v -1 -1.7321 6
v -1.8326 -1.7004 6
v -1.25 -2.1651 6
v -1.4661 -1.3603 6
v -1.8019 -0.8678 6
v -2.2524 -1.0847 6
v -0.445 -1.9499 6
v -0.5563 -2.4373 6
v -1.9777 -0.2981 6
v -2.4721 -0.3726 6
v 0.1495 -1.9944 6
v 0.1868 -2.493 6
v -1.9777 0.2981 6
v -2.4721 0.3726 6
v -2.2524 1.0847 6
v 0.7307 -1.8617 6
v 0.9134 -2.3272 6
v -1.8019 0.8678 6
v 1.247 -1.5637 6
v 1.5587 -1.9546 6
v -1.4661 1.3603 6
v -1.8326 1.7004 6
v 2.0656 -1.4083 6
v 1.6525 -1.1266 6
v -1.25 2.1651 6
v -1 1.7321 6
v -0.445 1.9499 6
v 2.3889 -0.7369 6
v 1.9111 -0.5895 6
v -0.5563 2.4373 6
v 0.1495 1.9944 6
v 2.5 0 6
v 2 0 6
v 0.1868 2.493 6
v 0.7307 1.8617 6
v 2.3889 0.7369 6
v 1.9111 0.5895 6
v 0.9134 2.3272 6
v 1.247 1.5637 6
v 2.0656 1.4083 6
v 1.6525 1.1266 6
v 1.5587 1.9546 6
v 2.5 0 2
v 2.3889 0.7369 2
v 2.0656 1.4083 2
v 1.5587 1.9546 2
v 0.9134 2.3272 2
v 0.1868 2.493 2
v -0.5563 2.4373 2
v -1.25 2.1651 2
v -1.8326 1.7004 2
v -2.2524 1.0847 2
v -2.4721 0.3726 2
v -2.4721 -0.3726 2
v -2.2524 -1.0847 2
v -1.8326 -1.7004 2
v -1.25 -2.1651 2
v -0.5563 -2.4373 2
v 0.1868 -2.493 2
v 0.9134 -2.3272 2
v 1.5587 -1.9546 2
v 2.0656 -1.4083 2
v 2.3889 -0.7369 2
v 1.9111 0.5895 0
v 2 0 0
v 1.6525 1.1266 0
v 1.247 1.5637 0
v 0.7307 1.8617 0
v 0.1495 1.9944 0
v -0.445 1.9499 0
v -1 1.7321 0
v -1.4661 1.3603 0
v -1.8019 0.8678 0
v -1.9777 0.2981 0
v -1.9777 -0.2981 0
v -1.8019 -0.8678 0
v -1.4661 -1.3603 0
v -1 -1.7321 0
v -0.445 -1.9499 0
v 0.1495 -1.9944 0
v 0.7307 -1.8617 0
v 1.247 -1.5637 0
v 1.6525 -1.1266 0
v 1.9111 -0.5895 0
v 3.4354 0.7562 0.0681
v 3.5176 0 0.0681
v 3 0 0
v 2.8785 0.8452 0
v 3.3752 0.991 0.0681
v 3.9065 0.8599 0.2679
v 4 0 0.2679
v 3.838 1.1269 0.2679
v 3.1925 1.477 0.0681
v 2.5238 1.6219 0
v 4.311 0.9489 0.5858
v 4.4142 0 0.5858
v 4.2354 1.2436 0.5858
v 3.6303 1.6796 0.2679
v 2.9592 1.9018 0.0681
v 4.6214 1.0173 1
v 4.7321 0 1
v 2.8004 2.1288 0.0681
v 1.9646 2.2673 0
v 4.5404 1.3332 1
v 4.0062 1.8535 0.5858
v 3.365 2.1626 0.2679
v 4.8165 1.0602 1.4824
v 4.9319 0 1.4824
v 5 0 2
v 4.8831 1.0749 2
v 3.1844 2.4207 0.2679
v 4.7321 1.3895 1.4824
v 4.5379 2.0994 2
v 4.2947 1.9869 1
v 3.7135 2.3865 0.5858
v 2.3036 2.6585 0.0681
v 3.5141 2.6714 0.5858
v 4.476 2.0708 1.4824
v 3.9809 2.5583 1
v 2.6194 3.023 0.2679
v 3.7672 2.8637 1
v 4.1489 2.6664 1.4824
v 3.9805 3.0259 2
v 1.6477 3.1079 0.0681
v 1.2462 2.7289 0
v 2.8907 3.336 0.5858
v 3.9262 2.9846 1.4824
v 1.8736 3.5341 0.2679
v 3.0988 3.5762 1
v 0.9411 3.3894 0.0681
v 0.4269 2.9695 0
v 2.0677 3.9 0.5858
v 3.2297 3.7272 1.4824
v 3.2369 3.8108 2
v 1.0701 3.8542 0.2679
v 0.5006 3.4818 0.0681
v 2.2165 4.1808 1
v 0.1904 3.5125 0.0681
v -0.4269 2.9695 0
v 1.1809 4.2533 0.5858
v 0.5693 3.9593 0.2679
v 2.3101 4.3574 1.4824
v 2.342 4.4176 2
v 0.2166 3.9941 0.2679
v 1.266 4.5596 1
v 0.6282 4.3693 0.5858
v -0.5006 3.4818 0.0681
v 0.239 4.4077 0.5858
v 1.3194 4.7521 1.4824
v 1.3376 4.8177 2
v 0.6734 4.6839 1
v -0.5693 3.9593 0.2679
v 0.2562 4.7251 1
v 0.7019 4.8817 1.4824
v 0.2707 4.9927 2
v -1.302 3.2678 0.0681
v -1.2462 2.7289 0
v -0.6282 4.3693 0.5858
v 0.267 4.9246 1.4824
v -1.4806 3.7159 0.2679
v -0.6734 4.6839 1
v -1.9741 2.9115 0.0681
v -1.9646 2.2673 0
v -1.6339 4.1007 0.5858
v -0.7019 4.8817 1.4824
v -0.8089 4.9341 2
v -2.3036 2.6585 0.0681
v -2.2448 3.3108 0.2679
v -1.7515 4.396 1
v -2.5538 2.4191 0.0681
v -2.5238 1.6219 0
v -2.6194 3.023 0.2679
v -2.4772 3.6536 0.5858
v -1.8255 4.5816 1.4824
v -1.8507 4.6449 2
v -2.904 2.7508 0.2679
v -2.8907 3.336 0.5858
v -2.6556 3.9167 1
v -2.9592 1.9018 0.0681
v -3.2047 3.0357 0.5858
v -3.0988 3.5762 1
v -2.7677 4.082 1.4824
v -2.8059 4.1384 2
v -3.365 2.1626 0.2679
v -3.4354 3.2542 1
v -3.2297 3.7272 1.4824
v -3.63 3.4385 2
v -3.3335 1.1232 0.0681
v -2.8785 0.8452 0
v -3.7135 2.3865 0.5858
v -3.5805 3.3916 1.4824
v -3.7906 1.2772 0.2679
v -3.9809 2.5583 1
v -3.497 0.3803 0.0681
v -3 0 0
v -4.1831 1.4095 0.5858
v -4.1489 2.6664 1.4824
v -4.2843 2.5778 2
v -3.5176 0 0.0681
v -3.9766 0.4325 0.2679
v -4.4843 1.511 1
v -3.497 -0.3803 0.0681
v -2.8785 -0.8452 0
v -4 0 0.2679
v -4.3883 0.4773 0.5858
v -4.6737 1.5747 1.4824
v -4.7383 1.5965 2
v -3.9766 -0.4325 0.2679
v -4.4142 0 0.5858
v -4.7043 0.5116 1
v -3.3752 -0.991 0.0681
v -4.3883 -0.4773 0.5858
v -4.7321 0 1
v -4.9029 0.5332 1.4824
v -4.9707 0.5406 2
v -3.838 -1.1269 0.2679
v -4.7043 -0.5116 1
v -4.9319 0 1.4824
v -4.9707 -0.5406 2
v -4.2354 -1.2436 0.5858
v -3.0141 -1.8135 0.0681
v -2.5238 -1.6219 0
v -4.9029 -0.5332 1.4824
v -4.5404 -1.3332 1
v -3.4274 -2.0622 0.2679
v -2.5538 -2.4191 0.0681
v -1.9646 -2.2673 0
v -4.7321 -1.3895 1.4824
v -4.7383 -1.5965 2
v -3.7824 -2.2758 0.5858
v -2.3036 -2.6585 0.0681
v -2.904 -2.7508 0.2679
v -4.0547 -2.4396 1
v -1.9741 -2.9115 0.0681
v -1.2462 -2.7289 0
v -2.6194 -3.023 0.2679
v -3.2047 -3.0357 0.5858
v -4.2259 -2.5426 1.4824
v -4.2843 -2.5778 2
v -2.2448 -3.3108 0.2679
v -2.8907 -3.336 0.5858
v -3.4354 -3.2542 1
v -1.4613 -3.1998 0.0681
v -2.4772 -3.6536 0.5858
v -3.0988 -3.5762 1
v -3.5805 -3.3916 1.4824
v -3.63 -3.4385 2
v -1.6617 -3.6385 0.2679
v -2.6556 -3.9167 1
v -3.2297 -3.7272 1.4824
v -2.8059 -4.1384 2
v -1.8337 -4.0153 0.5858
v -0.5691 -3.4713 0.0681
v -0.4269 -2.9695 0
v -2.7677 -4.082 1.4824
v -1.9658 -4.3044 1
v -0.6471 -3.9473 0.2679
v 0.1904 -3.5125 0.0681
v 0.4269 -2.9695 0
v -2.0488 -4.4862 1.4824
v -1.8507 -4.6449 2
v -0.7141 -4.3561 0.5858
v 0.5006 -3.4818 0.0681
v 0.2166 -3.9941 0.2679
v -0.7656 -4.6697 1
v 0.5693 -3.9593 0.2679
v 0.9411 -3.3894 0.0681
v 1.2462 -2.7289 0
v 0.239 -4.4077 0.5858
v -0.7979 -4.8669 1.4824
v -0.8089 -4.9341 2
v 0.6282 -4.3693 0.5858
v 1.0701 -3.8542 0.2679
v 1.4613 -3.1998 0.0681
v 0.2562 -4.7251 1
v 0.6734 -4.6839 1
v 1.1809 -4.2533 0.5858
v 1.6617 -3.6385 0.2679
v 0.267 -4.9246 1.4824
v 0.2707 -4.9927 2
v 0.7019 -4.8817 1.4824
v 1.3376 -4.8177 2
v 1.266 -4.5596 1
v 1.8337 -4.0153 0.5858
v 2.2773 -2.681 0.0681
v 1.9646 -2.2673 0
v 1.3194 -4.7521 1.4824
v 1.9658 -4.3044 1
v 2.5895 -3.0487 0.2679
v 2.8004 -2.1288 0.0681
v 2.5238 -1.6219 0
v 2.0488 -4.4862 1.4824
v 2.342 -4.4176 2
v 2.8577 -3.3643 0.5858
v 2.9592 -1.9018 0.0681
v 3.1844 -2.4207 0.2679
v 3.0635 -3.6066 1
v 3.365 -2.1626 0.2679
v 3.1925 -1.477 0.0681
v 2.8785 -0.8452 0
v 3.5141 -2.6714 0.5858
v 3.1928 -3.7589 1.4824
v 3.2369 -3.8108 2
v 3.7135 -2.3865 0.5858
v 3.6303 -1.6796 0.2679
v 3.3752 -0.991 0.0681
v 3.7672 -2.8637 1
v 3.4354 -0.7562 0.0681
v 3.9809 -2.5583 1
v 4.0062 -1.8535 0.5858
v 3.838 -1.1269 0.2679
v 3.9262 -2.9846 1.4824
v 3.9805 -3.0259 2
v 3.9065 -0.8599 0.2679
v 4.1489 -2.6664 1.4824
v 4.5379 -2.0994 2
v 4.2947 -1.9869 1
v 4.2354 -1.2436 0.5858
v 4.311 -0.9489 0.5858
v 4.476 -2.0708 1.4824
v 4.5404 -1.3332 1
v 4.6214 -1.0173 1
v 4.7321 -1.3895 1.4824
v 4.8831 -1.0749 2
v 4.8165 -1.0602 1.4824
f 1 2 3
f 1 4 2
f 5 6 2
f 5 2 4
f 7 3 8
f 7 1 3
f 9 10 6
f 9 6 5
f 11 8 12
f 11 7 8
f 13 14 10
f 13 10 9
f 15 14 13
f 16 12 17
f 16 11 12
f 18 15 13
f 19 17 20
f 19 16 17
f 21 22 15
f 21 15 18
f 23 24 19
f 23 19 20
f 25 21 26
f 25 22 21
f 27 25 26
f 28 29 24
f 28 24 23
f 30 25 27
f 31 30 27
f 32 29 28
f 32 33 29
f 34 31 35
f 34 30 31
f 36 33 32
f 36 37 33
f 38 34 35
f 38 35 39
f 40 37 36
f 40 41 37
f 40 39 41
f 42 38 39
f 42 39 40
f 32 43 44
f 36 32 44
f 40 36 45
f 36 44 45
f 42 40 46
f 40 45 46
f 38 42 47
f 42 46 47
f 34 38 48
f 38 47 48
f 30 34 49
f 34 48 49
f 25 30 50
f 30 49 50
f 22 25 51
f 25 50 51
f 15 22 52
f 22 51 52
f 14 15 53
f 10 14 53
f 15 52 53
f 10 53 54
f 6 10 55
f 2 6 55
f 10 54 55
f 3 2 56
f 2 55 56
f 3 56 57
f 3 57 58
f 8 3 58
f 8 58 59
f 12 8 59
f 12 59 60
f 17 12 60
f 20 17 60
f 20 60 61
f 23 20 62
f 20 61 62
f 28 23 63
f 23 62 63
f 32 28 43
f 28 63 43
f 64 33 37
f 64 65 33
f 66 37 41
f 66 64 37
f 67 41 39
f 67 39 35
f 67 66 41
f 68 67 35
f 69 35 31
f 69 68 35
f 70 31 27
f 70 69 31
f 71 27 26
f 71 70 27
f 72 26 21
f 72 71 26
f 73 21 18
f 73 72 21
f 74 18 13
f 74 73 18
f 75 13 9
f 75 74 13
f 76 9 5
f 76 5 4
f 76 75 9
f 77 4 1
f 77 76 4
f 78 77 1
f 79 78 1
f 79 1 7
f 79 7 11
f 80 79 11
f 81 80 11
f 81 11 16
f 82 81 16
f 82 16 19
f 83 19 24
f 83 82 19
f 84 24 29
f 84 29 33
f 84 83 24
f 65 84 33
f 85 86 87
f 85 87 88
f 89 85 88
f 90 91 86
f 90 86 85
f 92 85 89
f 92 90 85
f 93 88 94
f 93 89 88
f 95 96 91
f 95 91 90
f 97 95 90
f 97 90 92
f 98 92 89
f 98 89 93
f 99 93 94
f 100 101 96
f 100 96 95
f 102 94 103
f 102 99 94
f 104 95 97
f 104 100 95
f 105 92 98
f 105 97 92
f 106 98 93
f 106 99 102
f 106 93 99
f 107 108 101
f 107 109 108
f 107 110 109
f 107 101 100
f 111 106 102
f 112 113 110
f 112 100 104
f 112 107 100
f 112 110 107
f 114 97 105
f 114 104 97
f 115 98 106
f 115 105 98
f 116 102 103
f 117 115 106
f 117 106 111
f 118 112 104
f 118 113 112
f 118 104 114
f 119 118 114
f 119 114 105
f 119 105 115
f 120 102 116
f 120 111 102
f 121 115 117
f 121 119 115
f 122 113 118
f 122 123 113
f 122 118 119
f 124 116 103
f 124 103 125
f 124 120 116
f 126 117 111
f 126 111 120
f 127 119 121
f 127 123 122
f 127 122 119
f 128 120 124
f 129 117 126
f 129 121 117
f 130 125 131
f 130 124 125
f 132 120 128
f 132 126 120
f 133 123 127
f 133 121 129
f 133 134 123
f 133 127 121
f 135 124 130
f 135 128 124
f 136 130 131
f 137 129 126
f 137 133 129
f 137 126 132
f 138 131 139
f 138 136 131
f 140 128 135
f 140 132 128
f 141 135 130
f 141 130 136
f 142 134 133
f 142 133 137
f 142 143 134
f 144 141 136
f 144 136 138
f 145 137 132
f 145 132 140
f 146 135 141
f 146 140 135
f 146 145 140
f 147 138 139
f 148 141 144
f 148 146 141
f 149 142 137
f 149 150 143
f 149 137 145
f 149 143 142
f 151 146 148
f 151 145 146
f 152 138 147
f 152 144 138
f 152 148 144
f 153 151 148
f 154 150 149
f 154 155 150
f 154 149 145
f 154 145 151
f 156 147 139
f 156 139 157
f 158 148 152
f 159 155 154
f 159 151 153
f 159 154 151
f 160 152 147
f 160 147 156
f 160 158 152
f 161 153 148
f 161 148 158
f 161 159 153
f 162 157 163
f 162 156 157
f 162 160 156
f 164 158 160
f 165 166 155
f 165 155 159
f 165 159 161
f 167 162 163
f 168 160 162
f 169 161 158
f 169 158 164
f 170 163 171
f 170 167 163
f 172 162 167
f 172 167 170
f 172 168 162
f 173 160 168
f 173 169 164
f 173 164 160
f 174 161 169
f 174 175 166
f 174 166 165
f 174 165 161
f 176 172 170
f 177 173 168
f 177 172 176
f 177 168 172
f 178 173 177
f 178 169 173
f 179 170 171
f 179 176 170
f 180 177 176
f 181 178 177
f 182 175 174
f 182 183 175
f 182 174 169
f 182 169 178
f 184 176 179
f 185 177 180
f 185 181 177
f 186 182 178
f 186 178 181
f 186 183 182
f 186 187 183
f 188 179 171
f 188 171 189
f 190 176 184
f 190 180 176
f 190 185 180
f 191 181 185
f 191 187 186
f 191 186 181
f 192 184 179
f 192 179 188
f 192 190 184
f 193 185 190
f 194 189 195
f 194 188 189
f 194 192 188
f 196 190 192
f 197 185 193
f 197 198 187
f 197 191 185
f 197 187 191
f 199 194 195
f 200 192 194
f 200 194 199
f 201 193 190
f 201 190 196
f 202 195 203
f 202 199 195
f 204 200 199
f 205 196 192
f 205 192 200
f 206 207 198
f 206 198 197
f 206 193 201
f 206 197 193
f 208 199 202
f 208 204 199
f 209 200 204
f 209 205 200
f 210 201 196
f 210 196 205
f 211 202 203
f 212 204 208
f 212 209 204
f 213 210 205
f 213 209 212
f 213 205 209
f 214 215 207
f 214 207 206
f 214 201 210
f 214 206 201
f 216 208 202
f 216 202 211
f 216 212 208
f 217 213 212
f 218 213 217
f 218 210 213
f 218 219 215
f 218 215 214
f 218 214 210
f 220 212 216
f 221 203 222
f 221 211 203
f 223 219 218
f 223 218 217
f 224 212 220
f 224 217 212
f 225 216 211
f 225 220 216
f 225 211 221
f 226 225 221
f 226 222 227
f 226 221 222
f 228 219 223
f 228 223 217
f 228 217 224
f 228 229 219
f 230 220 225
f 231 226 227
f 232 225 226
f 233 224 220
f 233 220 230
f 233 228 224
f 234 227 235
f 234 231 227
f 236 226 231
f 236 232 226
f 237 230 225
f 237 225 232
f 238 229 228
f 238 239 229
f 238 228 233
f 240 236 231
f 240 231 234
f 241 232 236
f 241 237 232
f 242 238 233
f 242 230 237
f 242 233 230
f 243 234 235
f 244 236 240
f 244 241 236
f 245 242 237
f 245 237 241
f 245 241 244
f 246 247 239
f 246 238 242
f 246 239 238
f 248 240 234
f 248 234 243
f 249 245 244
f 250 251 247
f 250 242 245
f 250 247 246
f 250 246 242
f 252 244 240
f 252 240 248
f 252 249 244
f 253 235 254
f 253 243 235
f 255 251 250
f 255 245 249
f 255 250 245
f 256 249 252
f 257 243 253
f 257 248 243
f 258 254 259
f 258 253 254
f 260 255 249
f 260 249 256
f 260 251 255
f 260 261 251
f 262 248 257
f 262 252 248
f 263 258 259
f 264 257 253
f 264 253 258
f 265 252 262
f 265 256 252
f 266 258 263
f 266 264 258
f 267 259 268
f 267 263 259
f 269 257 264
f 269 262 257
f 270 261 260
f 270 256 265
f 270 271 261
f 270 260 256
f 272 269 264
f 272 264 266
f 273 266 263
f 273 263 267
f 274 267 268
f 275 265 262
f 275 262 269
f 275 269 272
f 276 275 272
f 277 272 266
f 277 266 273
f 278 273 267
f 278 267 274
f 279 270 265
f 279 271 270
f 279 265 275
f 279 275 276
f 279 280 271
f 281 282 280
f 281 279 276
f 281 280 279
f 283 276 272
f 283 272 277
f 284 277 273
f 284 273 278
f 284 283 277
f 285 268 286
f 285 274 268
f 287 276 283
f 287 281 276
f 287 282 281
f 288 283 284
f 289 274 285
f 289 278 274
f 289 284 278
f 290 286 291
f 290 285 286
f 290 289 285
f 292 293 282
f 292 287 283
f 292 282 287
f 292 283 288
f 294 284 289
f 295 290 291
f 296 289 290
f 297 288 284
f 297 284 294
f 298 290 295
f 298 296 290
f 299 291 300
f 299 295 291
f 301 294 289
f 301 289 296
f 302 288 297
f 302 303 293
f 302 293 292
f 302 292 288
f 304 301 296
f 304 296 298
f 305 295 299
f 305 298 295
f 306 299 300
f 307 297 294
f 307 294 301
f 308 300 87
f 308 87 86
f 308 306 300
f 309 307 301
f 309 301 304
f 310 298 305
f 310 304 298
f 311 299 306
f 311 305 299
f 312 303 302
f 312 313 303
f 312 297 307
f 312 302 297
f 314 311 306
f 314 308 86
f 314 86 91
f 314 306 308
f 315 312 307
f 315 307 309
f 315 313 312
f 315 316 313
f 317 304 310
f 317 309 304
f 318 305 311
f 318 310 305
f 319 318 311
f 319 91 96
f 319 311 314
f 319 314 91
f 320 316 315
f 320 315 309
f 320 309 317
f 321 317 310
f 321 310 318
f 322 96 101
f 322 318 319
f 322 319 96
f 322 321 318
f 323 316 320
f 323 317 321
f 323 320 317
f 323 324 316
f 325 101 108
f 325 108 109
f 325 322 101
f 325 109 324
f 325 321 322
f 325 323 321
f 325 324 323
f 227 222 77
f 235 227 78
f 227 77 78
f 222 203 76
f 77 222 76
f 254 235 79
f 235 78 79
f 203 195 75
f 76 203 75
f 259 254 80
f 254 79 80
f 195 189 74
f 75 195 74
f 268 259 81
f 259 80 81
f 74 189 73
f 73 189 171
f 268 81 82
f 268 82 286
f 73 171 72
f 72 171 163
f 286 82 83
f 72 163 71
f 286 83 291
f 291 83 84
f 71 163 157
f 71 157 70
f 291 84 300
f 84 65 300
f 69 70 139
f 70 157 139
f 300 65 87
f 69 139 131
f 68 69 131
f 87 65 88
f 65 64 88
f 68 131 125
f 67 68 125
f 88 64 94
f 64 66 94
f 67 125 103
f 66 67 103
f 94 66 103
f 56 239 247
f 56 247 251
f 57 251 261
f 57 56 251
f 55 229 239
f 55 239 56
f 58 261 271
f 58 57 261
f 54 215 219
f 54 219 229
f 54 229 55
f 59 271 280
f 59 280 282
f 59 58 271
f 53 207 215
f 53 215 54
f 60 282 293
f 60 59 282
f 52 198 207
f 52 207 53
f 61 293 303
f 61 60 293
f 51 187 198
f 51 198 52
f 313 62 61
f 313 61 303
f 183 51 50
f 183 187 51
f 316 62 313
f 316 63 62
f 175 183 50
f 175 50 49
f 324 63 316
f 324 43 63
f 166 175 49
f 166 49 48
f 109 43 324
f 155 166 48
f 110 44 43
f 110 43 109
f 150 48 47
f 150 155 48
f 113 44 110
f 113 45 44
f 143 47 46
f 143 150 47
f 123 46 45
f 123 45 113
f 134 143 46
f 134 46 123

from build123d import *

# Parameters (mm, degrees)
F0_R     = 5
F0_R_2   = 2
F2_DEPTH = 2
F3_R     = 2.5
F3_R_2   = 2
F4_DEPTH = 4
F5_R     = 1.99999


# Not quite as in the source:
# - a fillet or chamfer is up to 0.001 mm smaller than in the source, because OpenCascade refuses the exact size


with BuildPart() as f2:
    # F0 (on Top) → F2 (new body)
    with BuildSketch(Plane.XY):
        Circle(F0_R)
        Circle(F0_R_2, mode=Mode.SUBTRACT)
    extrude(amount=F2_DEPTH)

    # F3 (on face) → F4 (join)
    with BuildSketch(Plane.XY.offset(2)):
        Circle(F3_R)
        Circle(F3_R_2, mode=Mode.SUBTRACT)
    extrude(amount=F4_DEPTH)

    # F5 (radius 2 in the source; OpenCascade refuses exactly that, so slightly less here)
    f5_edges = [f2.edges().sort_by_distance(p)[0] for p in [
        (-5, 0, 0),
    ]]
    fillet(f5_edges, radius=F5_R)


solid = f2.part
